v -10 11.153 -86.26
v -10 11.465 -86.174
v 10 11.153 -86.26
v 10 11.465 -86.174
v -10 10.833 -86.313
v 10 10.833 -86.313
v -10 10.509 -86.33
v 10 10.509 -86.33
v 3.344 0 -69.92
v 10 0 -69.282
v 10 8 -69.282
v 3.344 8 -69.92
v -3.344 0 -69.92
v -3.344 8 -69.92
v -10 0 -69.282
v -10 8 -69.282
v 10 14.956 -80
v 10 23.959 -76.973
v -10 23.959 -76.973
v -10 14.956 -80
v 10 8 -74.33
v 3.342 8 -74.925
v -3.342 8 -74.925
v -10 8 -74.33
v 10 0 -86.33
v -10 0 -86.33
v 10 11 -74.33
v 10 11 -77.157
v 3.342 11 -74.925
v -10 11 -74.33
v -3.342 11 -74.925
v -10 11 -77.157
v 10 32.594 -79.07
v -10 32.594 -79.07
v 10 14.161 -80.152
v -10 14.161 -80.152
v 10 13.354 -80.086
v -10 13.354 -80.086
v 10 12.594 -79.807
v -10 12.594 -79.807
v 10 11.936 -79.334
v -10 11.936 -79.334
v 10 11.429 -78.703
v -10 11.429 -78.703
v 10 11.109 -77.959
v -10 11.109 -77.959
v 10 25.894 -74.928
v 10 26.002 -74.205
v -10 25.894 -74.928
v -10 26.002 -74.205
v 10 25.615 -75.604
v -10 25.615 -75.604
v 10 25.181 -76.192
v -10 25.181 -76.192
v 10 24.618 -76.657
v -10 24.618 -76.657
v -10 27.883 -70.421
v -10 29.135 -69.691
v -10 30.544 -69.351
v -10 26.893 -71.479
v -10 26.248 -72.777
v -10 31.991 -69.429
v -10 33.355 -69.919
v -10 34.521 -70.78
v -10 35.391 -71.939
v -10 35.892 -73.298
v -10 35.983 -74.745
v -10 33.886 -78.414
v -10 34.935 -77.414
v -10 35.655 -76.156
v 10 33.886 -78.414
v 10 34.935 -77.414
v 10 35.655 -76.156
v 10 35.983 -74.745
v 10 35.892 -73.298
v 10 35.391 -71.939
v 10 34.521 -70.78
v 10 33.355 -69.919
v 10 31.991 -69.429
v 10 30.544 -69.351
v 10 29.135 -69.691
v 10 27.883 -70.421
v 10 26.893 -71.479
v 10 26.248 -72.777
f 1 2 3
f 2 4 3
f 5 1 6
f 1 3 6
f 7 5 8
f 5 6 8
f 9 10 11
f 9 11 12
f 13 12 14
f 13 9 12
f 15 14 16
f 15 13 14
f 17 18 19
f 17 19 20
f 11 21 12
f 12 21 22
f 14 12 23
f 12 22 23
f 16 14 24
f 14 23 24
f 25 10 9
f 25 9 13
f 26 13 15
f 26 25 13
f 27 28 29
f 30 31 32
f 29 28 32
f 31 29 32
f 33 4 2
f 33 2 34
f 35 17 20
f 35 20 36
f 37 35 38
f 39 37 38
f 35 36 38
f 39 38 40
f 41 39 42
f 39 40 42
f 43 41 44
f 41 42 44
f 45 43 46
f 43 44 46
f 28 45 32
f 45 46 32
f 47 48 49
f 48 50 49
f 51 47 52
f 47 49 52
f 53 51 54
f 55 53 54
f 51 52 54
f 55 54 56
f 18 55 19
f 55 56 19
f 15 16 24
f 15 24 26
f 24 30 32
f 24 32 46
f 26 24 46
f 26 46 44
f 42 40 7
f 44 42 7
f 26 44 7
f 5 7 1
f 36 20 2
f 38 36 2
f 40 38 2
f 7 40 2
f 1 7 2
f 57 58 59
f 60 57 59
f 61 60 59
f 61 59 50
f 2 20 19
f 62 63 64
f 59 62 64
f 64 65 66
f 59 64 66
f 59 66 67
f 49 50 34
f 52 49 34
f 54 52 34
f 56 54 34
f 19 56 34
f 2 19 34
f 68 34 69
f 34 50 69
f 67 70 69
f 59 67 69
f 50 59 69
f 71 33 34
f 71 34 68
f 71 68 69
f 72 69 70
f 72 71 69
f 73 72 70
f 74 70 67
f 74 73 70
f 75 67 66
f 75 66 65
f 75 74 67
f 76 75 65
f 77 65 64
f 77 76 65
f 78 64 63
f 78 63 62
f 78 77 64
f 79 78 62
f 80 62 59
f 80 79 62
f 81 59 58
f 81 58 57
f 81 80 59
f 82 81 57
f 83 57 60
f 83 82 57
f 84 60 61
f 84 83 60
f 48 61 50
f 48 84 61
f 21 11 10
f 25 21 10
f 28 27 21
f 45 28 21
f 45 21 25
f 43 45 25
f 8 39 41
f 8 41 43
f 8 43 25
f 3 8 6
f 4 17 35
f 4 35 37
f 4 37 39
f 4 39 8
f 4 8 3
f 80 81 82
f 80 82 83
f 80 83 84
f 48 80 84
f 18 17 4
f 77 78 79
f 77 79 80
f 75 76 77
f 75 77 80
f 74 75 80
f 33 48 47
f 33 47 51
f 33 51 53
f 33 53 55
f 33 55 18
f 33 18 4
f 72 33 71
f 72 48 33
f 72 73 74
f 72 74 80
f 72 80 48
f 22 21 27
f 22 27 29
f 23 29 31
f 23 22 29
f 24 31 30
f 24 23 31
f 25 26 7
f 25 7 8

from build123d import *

# Parameters (mm, degrees)
BOSS_EXTRUDE1_DEPTH = 8
BOSS_EXTRUDE2_DEPTH = 3
BOSS_EXTRUDE3_DEPTH = 20
FILLET5_R           = 3


with BuildPart() as part:
    # Sketch1 → Boss-Extrude1 (new body)
    with BuildSketch(Plane(origin=(0, 0, 0), x_dir=(1, 0, 0), z_dir=(0, 1, 0))):
        with BuildLine():
            Line((-10, 69.282032303), (-10, 74.330343737))
            Line((-10, 74.330343737), (-10, 86.330343737))
            Line((-10, 86.330343737), (10, 86.330343737))
            Line((10, 86.330343737), (10, 74.330343737))
            Line((10, 74.330343737), (10, 69.282032303))
            ThreePointArc((10, 69.282032303), (0, 70), (-10, 69.282032303))
        make_face()
    extrude(amount=BOSS_EXTRUDE1_DEPTH)

    # Sketch2 → Boss-Extrude2 (add)
    with BuildSketch(Plane(origin=(0, 8, 0), x_dir=(1, 0, 0), z_dir=(0, 1, 0))):
        with BuildLine():
            Line((-10, 74.330343737), (-10, 86.330343737))
            Line((-10, 86.330343737), (10, 86.330343737))
            Line((10, 86.330343737), (10, 74.330343737))
            ThreePointArc((10, 74.330343737), (0, 75), (-10, 74.330343737))
        make_face()
    extrude(amount=BOSS_EXTRUDE2_DEPTH)

    # Sketch3 → Boss-Extrude3 (add)
    with BuildSketch(Plane(origin=(10, 0, 0), x_dir=(0, 0, -1), z_dir=(1, 0, 0))):
        with BuildLine():
            Line((81.330343737, 11), (86.330343737, 11))
            Line((86.330343737, 11), (79.069603203, 32.59355568))
            ThreePointArc((79.069603203, 32.59355568), (69.795873168, 33.106792981), (76.168874572, 26.350289862))
            Line((76.168874572, 26.350289862), (81.330343737, 11))
        make_face()
    extrude(amount=-BOSS_EXTRUDE3_DEPTH)

    # Fillet5
    fillet5_edges = [part.edges().sort_by_distance(p)[0] for p in [
        (0, 11, -86.330343737),
        (0, 11, -81.330343737),
        (0, 26.350289862, -76.168874572),
    ]]
    fillet(fillet5_edges, radius=FILLET5_R)


solid = part.part
